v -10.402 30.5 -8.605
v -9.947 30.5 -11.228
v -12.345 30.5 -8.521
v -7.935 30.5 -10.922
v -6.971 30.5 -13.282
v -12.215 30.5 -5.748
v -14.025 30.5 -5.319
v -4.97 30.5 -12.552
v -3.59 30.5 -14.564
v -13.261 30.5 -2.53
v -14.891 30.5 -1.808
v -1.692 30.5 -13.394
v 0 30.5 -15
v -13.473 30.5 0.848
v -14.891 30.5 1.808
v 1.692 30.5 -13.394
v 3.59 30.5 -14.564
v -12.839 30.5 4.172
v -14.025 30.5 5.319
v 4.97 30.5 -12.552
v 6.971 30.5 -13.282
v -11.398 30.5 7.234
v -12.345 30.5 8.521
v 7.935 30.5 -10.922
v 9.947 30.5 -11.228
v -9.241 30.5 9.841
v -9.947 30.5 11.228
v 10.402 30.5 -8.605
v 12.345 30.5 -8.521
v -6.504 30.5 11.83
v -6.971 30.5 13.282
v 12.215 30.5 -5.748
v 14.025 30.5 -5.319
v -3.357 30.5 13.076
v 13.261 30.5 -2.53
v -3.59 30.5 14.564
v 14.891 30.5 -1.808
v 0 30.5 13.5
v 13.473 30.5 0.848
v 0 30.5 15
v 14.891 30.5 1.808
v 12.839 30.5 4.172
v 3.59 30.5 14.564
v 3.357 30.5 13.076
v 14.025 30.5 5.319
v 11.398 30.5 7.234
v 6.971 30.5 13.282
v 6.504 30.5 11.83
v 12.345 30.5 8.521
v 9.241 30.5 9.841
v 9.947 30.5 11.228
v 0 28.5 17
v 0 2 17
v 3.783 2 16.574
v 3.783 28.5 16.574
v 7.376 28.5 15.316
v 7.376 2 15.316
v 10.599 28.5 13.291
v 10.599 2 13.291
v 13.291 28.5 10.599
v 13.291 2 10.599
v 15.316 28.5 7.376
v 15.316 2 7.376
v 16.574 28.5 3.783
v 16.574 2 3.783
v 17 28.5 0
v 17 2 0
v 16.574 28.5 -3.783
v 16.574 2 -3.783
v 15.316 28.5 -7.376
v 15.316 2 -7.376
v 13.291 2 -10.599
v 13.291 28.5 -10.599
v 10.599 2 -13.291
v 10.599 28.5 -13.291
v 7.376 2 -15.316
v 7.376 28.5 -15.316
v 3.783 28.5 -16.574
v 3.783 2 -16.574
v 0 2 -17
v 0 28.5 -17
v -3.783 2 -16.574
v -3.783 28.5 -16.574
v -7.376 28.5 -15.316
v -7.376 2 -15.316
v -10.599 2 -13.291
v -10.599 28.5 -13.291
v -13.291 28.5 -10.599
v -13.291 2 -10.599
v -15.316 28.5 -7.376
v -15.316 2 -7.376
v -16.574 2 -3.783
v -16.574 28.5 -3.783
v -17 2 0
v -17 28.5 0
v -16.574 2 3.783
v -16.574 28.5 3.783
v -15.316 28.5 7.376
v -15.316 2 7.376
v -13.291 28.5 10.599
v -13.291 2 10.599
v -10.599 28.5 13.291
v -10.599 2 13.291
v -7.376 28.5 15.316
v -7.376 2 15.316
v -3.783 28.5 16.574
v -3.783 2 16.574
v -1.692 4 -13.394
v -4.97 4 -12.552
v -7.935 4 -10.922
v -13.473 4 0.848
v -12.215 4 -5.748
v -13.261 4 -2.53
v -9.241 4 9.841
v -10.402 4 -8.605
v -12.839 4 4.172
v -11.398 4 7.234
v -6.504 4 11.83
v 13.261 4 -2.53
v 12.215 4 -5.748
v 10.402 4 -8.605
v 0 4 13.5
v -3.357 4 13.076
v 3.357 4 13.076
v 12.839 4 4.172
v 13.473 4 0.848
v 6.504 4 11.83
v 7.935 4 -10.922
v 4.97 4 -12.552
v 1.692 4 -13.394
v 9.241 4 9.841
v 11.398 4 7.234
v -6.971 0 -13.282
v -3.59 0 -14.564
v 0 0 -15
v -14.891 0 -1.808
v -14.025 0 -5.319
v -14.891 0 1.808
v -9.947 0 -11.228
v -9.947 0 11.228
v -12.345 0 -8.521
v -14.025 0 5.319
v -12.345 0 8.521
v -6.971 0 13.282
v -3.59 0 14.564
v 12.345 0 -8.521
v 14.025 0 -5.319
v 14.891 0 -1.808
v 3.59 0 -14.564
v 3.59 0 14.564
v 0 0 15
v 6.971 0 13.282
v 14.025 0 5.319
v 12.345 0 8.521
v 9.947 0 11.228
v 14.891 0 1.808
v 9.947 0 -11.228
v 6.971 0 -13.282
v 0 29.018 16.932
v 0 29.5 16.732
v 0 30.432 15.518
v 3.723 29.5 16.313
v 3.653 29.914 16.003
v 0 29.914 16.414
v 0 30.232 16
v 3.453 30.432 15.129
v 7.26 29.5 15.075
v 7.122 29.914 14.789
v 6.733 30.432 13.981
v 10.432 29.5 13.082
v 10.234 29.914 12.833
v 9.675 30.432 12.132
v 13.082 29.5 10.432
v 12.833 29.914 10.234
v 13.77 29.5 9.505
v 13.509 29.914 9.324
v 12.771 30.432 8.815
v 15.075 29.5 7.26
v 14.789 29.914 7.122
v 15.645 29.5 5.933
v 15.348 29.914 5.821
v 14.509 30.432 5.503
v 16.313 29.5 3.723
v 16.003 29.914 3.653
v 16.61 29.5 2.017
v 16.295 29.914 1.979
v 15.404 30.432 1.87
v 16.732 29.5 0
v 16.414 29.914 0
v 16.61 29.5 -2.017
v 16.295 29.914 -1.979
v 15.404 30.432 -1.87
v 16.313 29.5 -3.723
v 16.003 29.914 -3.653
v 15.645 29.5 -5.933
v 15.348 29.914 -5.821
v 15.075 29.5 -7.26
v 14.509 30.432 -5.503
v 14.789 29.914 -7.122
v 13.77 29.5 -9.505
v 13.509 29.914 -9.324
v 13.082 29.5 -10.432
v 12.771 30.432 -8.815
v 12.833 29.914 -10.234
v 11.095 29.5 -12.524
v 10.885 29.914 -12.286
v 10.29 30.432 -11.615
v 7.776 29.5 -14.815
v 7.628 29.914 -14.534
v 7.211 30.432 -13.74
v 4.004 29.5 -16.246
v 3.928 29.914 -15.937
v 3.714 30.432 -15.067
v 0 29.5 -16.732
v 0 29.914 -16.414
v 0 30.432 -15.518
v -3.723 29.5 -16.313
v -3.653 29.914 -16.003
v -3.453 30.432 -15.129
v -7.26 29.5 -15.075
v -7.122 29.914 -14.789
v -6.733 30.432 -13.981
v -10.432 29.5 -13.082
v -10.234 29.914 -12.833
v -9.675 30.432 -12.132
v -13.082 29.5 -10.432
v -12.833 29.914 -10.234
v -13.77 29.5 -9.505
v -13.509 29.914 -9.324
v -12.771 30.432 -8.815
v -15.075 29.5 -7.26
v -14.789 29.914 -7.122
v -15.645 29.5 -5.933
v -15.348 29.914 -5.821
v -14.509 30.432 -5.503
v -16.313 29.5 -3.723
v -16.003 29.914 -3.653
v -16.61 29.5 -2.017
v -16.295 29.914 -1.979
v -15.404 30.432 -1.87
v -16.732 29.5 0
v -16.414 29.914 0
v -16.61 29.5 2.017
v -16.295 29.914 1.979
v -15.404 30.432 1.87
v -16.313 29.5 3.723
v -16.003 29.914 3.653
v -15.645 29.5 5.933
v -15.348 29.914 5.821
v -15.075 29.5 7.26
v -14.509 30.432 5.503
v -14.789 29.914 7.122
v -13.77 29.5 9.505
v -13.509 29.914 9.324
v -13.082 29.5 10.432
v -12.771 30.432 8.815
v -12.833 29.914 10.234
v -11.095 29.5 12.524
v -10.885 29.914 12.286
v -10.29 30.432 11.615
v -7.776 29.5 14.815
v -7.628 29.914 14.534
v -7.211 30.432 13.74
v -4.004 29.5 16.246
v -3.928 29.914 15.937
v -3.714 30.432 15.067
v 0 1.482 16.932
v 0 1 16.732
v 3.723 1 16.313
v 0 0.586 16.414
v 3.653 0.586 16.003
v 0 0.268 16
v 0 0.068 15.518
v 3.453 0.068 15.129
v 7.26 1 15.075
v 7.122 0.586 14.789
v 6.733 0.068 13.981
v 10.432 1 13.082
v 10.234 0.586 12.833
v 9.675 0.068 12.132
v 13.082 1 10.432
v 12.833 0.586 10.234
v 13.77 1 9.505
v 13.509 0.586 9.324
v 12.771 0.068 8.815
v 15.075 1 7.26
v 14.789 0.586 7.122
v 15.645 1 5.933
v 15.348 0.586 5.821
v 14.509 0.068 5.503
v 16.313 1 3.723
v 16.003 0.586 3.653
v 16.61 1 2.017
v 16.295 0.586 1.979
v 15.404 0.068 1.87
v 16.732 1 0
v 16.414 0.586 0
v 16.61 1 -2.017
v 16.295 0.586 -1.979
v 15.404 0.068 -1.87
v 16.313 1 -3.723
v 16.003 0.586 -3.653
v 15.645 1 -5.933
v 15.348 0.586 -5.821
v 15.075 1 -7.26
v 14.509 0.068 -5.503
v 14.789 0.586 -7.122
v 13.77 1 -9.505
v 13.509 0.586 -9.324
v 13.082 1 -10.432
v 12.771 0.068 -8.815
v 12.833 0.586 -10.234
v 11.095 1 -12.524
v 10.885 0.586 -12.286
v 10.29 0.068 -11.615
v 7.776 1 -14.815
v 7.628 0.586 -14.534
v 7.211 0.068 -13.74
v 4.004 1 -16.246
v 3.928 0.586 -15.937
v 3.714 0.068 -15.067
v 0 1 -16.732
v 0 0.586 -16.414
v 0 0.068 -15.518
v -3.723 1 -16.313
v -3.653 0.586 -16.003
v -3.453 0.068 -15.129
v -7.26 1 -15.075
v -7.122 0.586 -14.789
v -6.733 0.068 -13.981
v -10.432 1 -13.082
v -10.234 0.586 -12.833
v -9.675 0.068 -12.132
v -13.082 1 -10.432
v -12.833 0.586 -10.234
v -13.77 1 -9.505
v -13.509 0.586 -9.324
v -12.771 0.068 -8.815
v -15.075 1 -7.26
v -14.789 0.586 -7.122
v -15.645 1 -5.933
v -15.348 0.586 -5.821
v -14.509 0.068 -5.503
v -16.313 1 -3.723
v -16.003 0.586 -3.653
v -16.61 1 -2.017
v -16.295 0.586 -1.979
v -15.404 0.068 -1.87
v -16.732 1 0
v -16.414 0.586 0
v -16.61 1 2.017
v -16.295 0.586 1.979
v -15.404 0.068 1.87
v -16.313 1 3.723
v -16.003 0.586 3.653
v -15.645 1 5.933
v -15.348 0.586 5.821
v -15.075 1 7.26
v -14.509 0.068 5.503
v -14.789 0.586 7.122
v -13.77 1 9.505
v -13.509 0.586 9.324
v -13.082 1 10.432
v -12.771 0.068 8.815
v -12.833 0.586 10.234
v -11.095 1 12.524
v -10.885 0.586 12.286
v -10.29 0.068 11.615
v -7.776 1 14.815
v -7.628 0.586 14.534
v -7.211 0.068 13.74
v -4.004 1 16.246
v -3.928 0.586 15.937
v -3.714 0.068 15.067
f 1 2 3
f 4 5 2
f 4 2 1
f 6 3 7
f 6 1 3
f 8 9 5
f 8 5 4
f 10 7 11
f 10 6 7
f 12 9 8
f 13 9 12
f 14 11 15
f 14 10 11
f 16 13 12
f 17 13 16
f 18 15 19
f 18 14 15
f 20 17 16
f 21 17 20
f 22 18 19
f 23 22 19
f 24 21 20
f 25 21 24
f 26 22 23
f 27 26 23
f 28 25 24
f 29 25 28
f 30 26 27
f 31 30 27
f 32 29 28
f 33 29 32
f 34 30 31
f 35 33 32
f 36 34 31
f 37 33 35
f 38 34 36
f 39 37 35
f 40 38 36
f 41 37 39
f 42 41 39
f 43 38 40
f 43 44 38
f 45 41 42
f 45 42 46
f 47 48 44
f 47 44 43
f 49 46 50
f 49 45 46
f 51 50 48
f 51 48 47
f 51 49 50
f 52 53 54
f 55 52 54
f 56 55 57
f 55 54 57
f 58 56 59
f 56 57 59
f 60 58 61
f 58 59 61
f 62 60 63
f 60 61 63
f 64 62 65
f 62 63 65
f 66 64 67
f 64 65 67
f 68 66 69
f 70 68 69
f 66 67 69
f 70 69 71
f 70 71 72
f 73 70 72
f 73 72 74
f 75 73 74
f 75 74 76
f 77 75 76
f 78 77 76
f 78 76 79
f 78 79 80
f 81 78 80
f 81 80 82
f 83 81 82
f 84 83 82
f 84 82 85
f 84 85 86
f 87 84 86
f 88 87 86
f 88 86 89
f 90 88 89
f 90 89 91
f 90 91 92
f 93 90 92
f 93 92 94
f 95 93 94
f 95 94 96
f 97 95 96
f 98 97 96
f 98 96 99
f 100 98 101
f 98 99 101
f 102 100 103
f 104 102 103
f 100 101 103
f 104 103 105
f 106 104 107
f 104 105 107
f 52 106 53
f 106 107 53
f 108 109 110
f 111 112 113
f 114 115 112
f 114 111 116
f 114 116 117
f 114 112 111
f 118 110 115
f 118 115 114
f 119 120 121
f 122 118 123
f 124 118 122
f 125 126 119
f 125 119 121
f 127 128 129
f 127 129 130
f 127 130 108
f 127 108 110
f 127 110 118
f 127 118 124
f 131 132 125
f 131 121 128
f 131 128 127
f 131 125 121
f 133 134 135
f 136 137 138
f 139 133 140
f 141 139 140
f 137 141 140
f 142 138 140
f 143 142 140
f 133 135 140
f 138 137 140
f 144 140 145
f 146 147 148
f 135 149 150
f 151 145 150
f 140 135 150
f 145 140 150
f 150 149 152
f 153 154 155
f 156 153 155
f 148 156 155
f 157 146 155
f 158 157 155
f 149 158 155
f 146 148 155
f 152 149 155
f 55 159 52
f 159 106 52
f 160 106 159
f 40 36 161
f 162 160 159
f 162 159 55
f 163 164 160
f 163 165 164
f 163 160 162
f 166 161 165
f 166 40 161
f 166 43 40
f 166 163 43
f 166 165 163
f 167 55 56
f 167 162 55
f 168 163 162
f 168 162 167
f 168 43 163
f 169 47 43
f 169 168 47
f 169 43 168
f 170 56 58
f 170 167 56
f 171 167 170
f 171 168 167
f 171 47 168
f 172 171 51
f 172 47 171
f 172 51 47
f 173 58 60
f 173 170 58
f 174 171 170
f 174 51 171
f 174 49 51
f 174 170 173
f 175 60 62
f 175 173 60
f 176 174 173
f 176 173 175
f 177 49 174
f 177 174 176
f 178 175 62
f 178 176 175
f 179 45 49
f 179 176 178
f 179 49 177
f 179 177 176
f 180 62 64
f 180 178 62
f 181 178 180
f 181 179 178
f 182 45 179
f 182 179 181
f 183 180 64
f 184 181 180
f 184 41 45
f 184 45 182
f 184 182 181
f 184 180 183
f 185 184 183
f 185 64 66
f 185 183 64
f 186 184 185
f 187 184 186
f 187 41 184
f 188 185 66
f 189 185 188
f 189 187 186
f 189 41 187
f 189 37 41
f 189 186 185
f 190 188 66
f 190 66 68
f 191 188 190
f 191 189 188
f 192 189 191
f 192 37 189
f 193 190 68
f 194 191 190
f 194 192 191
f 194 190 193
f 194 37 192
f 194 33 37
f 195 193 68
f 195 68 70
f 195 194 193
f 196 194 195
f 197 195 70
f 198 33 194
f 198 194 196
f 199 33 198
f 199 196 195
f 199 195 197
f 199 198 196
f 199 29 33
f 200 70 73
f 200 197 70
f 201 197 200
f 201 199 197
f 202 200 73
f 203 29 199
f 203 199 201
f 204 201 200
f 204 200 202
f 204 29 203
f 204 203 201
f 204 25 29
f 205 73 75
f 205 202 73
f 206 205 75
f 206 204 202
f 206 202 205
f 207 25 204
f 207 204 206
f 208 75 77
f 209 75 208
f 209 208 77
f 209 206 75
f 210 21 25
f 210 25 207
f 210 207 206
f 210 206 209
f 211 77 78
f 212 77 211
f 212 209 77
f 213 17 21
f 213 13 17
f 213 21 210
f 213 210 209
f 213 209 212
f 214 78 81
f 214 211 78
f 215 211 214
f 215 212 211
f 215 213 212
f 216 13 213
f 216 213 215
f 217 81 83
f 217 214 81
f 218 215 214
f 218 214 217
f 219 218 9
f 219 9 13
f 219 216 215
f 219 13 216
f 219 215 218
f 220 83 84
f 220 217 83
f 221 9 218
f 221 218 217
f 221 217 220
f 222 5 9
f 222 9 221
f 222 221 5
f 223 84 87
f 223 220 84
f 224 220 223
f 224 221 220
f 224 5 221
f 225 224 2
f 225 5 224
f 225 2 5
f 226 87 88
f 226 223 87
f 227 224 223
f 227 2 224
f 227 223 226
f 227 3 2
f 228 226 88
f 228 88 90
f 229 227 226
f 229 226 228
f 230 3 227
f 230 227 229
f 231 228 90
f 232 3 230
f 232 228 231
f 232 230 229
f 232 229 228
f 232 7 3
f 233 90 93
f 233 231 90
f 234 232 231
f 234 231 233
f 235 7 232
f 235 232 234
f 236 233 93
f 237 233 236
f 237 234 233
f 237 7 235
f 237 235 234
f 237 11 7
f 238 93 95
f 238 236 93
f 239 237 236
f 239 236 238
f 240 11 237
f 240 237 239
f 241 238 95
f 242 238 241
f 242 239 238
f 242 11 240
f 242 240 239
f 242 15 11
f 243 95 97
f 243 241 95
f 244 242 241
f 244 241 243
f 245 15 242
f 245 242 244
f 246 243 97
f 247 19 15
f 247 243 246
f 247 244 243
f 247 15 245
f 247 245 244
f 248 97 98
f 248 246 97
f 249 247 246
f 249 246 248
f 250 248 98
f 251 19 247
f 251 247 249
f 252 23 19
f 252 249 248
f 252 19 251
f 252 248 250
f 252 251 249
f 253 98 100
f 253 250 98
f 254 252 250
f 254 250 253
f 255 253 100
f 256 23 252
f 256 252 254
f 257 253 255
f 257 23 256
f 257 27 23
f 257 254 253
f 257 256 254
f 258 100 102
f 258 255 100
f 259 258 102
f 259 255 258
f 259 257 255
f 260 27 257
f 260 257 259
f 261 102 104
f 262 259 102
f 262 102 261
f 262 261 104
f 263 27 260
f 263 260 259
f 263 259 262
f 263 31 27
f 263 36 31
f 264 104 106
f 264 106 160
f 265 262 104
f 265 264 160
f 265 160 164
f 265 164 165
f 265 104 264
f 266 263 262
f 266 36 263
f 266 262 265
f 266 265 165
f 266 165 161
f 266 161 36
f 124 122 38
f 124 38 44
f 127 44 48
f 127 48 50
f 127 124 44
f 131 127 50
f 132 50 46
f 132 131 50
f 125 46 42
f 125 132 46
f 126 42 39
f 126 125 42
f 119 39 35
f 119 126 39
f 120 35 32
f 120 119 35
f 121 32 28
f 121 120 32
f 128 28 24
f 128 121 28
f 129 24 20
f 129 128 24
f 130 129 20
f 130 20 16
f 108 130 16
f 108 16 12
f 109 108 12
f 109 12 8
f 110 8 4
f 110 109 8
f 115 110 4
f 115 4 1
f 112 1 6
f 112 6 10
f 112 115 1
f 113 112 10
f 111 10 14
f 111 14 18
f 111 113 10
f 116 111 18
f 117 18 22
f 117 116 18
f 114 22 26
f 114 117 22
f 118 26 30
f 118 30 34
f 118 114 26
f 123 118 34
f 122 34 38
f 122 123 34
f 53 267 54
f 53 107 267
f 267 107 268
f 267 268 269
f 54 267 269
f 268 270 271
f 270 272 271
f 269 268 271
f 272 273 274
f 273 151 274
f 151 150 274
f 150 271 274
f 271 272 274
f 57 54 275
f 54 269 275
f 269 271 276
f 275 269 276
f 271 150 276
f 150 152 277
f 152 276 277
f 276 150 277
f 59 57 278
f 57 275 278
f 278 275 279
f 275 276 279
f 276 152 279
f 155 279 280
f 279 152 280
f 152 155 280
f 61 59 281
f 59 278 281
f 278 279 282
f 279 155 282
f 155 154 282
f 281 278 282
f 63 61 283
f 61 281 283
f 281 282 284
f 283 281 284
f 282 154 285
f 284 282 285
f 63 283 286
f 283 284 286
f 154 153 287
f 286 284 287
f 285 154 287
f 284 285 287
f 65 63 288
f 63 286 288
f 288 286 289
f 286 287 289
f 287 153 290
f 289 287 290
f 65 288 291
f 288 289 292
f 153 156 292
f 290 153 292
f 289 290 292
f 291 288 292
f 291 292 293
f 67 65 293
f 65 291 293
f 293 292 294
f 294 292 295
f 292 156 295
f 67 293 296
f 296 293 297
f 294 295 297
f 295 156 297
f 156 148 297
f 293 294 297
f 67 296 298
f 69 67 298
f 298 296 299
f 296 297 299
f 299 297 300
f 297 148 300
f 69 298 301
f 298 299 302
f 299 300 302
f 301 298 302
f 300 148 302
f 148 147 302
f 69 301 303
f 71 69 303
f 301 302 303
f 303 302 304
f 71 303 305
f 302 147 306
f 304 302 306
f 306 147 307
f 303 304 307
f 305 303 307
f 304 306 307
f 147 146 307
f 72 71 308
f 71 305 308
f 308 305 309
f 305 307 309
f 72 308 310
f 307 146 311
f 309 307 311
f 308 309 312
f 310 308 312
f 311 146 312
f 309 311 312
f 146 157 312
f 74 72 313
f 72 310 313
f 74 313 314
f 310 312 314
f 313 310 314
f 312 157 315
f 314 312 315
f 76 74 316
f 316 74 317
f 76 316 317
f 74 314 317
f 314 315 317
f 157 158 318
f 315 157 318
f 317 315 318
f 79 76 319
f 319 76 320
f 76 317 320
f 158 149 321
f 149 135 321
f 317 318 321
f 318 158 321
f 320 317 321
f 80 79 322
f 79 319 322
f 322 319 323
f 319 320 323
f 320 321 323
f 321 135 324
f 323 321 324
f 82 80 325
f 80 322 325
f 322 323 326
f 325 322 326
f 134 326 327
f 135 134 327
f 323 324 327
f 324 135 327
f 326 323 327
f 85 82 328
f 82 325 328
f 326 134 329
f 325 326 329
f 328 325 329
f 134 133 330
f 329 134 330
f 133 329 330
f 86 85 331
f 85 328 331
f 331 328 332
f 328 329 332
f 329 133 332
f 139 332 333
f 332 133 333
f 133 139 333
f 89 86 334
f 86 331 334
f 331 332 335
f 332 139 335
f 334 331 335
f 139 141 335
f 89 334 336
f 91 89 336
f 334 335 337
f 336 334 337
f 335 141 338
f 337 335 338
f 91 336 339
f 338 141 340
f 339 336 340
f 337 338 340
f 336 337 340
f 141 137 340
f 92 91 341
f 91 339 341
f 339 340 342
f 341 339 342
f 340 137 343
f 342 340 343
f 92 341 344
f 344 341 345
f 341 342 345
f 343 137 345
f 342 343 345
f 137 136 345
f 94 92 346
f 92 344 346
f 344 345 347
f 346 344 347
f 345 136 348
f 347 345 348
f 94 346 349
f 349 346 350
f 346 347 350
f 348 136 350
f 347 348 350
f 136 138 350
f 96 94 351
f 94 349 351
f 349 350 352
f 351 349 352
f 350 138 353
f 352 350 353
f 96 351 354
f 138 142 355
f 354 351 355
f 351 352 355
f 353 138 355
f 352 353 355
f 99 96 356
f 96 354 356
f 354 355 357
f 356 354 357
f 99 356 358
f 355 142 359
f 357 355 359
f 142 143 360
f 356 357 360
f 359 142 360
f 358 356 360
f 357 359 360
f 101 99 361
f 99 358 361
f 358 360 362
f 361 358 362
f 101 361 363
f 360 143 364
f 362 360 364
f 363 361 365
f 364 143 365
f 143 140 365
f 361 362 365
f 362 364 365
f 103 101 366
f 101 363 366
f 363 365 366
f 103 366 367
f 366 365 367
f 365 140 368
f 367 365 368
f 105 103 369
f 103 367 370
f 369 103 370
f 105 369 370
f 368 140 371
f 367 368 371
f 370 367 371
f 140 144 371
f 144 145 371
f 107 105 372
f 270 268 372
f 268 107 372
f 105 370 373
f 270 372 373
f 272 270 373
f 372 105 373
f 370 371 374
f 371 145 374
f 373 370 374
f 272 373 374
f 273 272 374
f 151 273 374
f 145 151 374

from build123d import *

# Parameters (mm, degrees)
SKETCH1_R           = 17
BOSS_EXTRUDE1_DEPTH = 4
SKETCH2_R           = 17
SKETCH2_R_2         = 13.5
BOSS_EXTRUDE2_DEPTH = 26.5
FILLET1_R           = 2


with BuildPart() as part:
    # Sketch1 → Boss-Extrude1 (new body)
    with BuildSketch(Plane(origin=(0, 0, 0), x_dir=(1, 0, 0), z_dir=(0, 1, 0))):
        with Locations(Location((0, 0, 0), (0, 0, 270))):
            Circle(SKETCH1_R)
    extrude(amount=BOSS_EXTRUDE1_DEPTH)

    # Sketch2 → Boss-Extrude2 (add)
    with BuildSketch(Plane(origin=(0, 4, 0), x_dir=(1, 0, 0), z_dir=(0, 1, 0))):
        with Locations(Location((0, 0, 0), (0, 0, 270))):
            Circle(SKETCH2_R)
        with Locations(Location((0, 0, 0), (0, 0, 270))):
            Circle(SKETCH2_R_2, mode=Mode.SUBTRACT)
    extrude(amount=BOSS_EXTRUDE2_DEPTH)

    # Fillet1
    fillet1_edges = [part.edges().sort_by_distance(p)[0] for p in [
        (0, 0, -17),
        (0, 30.5, -17),
    ]]
    fillet(fillet1_edges, radius=FILLET1_R)


solid = part.part
